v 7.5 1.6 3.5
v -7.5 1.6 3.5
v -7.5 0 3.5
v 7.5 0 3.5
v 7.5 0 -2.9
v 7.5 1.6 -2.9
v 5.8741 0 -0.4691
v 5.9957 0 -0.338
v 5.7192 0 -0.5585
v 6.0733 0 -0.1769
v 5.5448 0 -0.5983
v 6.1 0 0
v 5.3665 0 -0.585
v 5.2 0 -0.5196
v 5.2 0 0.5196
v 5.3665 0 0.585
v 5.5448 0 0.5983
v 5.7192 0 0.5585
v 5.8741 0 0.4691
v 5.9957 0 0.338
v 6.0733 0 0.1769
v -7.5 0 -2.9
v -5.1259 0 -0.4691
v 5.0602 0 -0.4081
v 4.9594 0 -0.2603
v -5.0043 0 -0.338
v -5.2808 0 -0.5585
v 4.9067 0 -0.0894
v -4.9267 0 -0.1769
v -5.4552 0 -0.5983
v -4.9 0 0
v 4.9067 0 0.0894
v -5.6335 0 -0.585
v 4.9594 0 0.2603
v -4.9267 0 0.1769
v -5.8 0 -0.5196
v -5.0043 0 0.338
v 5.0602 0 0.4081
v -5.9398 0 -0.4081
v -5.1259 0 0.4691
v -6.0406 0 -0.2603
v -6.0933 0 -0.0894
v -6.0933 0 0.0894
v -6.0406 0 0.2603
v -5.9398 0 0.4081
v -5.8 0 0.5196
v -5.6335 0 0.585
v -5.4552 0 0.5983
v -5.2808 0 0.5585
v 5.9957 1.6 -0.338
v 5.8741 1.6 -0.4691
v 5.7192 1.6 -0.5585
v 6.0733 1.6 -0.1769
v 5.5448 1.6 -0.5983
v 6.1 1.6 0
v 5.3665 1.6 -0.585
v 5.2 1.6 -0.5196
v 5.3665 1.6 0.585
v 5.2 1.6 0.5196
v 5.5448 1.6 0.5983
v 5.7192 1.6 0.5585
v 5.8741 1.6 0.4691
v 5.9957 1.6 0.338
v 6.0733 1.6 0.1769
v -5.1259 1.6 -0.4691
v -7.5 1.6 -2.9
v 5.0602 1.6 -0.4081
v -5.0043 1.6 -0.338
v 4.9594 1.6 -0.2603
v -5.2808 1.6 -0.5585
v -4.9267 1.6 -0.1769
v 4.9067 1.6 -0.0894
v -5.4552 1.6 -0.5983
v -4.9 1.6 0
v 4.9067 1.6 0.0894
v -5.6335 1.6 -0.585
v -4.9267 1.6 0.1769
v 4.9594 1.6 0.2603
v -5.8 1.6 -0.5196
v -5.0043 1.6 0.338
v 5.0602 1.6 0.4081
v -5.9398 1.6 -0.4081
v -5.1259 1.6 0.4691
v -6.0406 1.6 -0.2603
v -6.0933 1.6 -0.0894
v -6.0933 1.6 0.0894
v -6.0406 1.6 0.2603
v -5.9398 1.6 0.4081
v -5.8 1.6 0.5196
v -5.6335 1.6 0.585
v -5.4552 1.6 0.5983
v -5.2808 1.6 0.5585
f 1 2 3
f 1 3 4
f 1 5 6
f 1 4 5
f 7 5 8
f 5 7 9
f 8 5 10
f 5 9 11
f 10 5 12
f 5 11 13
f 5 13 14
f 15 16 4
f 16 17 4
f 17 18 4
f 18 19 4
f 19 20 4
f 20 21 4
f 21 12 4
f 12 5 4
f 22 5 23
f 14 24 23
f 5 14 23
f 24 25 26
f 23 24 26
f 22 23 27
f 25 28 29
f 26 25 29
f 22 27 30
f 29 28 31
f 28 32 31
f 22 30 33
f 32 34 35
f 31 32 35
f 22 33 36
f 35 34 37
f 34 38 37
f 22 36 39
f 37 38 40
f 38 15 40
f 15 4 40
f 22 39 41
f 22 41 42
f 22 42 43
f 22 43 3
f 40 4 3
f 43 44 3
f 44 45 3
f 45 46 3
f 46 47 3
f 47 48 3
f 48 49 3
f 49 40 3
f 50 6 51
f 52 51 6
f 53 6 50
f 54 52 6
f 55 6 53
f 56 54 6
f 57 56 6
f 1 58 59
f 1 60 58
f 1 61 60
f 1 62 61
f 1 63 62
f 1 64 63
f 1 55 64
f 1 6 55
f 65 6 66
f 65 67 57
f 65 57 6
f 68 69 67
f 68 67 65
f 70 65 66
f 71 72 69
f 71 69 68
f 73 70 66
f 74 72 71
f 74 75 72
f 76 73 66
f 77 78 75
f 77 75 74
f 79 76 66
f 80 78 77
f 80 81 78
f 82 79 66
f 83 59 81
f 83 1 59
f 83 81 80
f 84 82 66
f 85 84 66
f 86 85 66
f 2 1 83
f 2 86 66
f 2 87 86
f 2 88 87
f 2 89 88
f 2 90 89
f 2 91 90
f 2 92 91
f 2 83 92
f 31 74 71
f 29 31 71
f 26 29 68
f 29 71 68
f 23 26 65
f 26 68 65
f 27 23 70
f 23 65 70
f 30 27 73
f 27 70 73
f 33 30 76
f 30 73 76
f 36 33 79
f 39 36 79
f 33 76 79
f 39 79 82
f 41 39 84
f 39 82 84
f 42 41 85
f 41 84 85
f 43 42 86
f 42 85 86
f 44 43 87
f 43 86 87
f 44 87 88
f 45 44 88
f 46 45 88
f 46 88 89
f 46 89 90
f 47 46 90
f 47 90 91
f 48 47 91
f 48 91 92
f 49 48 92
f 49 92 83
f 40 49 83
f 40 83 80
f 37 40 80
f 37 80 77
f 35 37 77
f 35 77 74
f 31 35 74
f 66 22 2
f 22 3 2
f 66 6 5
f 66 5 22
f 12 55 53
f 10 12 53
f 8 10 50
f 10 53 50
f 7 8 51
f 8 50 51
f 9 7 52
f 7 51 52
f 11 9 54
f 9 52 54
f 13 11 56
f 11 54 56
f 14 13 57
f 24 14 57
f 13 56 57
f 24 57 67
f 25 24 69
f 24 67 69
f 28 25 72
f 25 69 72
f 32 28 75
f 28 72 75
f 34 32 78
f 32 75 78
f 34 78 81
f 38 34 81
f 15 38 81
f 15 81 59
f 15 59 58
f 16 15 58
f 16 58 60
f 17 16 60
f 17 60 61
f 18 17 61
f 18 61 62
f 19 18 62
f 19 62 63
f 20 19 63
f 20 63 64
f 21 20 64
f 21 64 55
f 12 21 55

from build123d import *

# Parameters (mm, degrees)
SKETCH1_W           = 15
SKETCH1_H           = 4
BOSS_EXTRUDE1_DEPTH = 1.6
SKETCH5_W           = 15
SKETCH5_H           = 1.6
BOSS_EXTRUDE4_DEPTH = 1.5
SKETCH6_W           = 15
SKETCH6_H           = 1.6
BOSS_EXTRUDE5_DEPTH = 0.9
SKETCH8_R           = 0.6
CUT_EXTRUDE1_DEPTH  = 10


with BuildPart() as part:
    # Sketch1 → Boss-Extrude1 (new body)
    with BuildSketch(Plane(origin=(0, 0, 0), x_dir=(1, 0, 0), z_dir=(0, 1, 0))):
        Rectangle(SKETCH1_W, SKETCH1_H)
    extrude(amount=BOSS_EXTRUDE1_DEPTH)

    # Sketch5 → Boss-Extrude4 (add)
    with BuildSketch(Plane.XY.offset(2)):
        with Locations((0, 0.8)):
            Rectangle(SKETCH5_W, SKETCH5_H)
    extrude(amount=BOSS_EXTRUDE4_DEPTH)

    # Sketch6 → Boss-Extrude5 (add)
    with BuildSketch(Plane(origin=(0, 0, -2), x_dir=(-1, 0, 0), z_dir=(0, 0, -1))):
        with Locations((0, 0.8)):
            Rectangle(SKETCH6_W, SKETCH6_H)
    extrude(amount=BOSS_EXTRUDE5_DEPTH)

    # Sketch8 → Cut-Extrude1 (cut)
    with BuildSketch(Plane(origin=(0, 1.6, 0), x_dir=(1, 0, 0), z_dir=(0, 1, 0))):
        with Locations((5.5, 0)):
            Circle(SKETCH8_R)
        with Locations((-5.5, 0)):
            Circle(SKETCH8_R)
    extrude(amount=-CUT_EXTRUDE1_DEPTH, mode=Mode.SUBTRACT)


solid = part.part
